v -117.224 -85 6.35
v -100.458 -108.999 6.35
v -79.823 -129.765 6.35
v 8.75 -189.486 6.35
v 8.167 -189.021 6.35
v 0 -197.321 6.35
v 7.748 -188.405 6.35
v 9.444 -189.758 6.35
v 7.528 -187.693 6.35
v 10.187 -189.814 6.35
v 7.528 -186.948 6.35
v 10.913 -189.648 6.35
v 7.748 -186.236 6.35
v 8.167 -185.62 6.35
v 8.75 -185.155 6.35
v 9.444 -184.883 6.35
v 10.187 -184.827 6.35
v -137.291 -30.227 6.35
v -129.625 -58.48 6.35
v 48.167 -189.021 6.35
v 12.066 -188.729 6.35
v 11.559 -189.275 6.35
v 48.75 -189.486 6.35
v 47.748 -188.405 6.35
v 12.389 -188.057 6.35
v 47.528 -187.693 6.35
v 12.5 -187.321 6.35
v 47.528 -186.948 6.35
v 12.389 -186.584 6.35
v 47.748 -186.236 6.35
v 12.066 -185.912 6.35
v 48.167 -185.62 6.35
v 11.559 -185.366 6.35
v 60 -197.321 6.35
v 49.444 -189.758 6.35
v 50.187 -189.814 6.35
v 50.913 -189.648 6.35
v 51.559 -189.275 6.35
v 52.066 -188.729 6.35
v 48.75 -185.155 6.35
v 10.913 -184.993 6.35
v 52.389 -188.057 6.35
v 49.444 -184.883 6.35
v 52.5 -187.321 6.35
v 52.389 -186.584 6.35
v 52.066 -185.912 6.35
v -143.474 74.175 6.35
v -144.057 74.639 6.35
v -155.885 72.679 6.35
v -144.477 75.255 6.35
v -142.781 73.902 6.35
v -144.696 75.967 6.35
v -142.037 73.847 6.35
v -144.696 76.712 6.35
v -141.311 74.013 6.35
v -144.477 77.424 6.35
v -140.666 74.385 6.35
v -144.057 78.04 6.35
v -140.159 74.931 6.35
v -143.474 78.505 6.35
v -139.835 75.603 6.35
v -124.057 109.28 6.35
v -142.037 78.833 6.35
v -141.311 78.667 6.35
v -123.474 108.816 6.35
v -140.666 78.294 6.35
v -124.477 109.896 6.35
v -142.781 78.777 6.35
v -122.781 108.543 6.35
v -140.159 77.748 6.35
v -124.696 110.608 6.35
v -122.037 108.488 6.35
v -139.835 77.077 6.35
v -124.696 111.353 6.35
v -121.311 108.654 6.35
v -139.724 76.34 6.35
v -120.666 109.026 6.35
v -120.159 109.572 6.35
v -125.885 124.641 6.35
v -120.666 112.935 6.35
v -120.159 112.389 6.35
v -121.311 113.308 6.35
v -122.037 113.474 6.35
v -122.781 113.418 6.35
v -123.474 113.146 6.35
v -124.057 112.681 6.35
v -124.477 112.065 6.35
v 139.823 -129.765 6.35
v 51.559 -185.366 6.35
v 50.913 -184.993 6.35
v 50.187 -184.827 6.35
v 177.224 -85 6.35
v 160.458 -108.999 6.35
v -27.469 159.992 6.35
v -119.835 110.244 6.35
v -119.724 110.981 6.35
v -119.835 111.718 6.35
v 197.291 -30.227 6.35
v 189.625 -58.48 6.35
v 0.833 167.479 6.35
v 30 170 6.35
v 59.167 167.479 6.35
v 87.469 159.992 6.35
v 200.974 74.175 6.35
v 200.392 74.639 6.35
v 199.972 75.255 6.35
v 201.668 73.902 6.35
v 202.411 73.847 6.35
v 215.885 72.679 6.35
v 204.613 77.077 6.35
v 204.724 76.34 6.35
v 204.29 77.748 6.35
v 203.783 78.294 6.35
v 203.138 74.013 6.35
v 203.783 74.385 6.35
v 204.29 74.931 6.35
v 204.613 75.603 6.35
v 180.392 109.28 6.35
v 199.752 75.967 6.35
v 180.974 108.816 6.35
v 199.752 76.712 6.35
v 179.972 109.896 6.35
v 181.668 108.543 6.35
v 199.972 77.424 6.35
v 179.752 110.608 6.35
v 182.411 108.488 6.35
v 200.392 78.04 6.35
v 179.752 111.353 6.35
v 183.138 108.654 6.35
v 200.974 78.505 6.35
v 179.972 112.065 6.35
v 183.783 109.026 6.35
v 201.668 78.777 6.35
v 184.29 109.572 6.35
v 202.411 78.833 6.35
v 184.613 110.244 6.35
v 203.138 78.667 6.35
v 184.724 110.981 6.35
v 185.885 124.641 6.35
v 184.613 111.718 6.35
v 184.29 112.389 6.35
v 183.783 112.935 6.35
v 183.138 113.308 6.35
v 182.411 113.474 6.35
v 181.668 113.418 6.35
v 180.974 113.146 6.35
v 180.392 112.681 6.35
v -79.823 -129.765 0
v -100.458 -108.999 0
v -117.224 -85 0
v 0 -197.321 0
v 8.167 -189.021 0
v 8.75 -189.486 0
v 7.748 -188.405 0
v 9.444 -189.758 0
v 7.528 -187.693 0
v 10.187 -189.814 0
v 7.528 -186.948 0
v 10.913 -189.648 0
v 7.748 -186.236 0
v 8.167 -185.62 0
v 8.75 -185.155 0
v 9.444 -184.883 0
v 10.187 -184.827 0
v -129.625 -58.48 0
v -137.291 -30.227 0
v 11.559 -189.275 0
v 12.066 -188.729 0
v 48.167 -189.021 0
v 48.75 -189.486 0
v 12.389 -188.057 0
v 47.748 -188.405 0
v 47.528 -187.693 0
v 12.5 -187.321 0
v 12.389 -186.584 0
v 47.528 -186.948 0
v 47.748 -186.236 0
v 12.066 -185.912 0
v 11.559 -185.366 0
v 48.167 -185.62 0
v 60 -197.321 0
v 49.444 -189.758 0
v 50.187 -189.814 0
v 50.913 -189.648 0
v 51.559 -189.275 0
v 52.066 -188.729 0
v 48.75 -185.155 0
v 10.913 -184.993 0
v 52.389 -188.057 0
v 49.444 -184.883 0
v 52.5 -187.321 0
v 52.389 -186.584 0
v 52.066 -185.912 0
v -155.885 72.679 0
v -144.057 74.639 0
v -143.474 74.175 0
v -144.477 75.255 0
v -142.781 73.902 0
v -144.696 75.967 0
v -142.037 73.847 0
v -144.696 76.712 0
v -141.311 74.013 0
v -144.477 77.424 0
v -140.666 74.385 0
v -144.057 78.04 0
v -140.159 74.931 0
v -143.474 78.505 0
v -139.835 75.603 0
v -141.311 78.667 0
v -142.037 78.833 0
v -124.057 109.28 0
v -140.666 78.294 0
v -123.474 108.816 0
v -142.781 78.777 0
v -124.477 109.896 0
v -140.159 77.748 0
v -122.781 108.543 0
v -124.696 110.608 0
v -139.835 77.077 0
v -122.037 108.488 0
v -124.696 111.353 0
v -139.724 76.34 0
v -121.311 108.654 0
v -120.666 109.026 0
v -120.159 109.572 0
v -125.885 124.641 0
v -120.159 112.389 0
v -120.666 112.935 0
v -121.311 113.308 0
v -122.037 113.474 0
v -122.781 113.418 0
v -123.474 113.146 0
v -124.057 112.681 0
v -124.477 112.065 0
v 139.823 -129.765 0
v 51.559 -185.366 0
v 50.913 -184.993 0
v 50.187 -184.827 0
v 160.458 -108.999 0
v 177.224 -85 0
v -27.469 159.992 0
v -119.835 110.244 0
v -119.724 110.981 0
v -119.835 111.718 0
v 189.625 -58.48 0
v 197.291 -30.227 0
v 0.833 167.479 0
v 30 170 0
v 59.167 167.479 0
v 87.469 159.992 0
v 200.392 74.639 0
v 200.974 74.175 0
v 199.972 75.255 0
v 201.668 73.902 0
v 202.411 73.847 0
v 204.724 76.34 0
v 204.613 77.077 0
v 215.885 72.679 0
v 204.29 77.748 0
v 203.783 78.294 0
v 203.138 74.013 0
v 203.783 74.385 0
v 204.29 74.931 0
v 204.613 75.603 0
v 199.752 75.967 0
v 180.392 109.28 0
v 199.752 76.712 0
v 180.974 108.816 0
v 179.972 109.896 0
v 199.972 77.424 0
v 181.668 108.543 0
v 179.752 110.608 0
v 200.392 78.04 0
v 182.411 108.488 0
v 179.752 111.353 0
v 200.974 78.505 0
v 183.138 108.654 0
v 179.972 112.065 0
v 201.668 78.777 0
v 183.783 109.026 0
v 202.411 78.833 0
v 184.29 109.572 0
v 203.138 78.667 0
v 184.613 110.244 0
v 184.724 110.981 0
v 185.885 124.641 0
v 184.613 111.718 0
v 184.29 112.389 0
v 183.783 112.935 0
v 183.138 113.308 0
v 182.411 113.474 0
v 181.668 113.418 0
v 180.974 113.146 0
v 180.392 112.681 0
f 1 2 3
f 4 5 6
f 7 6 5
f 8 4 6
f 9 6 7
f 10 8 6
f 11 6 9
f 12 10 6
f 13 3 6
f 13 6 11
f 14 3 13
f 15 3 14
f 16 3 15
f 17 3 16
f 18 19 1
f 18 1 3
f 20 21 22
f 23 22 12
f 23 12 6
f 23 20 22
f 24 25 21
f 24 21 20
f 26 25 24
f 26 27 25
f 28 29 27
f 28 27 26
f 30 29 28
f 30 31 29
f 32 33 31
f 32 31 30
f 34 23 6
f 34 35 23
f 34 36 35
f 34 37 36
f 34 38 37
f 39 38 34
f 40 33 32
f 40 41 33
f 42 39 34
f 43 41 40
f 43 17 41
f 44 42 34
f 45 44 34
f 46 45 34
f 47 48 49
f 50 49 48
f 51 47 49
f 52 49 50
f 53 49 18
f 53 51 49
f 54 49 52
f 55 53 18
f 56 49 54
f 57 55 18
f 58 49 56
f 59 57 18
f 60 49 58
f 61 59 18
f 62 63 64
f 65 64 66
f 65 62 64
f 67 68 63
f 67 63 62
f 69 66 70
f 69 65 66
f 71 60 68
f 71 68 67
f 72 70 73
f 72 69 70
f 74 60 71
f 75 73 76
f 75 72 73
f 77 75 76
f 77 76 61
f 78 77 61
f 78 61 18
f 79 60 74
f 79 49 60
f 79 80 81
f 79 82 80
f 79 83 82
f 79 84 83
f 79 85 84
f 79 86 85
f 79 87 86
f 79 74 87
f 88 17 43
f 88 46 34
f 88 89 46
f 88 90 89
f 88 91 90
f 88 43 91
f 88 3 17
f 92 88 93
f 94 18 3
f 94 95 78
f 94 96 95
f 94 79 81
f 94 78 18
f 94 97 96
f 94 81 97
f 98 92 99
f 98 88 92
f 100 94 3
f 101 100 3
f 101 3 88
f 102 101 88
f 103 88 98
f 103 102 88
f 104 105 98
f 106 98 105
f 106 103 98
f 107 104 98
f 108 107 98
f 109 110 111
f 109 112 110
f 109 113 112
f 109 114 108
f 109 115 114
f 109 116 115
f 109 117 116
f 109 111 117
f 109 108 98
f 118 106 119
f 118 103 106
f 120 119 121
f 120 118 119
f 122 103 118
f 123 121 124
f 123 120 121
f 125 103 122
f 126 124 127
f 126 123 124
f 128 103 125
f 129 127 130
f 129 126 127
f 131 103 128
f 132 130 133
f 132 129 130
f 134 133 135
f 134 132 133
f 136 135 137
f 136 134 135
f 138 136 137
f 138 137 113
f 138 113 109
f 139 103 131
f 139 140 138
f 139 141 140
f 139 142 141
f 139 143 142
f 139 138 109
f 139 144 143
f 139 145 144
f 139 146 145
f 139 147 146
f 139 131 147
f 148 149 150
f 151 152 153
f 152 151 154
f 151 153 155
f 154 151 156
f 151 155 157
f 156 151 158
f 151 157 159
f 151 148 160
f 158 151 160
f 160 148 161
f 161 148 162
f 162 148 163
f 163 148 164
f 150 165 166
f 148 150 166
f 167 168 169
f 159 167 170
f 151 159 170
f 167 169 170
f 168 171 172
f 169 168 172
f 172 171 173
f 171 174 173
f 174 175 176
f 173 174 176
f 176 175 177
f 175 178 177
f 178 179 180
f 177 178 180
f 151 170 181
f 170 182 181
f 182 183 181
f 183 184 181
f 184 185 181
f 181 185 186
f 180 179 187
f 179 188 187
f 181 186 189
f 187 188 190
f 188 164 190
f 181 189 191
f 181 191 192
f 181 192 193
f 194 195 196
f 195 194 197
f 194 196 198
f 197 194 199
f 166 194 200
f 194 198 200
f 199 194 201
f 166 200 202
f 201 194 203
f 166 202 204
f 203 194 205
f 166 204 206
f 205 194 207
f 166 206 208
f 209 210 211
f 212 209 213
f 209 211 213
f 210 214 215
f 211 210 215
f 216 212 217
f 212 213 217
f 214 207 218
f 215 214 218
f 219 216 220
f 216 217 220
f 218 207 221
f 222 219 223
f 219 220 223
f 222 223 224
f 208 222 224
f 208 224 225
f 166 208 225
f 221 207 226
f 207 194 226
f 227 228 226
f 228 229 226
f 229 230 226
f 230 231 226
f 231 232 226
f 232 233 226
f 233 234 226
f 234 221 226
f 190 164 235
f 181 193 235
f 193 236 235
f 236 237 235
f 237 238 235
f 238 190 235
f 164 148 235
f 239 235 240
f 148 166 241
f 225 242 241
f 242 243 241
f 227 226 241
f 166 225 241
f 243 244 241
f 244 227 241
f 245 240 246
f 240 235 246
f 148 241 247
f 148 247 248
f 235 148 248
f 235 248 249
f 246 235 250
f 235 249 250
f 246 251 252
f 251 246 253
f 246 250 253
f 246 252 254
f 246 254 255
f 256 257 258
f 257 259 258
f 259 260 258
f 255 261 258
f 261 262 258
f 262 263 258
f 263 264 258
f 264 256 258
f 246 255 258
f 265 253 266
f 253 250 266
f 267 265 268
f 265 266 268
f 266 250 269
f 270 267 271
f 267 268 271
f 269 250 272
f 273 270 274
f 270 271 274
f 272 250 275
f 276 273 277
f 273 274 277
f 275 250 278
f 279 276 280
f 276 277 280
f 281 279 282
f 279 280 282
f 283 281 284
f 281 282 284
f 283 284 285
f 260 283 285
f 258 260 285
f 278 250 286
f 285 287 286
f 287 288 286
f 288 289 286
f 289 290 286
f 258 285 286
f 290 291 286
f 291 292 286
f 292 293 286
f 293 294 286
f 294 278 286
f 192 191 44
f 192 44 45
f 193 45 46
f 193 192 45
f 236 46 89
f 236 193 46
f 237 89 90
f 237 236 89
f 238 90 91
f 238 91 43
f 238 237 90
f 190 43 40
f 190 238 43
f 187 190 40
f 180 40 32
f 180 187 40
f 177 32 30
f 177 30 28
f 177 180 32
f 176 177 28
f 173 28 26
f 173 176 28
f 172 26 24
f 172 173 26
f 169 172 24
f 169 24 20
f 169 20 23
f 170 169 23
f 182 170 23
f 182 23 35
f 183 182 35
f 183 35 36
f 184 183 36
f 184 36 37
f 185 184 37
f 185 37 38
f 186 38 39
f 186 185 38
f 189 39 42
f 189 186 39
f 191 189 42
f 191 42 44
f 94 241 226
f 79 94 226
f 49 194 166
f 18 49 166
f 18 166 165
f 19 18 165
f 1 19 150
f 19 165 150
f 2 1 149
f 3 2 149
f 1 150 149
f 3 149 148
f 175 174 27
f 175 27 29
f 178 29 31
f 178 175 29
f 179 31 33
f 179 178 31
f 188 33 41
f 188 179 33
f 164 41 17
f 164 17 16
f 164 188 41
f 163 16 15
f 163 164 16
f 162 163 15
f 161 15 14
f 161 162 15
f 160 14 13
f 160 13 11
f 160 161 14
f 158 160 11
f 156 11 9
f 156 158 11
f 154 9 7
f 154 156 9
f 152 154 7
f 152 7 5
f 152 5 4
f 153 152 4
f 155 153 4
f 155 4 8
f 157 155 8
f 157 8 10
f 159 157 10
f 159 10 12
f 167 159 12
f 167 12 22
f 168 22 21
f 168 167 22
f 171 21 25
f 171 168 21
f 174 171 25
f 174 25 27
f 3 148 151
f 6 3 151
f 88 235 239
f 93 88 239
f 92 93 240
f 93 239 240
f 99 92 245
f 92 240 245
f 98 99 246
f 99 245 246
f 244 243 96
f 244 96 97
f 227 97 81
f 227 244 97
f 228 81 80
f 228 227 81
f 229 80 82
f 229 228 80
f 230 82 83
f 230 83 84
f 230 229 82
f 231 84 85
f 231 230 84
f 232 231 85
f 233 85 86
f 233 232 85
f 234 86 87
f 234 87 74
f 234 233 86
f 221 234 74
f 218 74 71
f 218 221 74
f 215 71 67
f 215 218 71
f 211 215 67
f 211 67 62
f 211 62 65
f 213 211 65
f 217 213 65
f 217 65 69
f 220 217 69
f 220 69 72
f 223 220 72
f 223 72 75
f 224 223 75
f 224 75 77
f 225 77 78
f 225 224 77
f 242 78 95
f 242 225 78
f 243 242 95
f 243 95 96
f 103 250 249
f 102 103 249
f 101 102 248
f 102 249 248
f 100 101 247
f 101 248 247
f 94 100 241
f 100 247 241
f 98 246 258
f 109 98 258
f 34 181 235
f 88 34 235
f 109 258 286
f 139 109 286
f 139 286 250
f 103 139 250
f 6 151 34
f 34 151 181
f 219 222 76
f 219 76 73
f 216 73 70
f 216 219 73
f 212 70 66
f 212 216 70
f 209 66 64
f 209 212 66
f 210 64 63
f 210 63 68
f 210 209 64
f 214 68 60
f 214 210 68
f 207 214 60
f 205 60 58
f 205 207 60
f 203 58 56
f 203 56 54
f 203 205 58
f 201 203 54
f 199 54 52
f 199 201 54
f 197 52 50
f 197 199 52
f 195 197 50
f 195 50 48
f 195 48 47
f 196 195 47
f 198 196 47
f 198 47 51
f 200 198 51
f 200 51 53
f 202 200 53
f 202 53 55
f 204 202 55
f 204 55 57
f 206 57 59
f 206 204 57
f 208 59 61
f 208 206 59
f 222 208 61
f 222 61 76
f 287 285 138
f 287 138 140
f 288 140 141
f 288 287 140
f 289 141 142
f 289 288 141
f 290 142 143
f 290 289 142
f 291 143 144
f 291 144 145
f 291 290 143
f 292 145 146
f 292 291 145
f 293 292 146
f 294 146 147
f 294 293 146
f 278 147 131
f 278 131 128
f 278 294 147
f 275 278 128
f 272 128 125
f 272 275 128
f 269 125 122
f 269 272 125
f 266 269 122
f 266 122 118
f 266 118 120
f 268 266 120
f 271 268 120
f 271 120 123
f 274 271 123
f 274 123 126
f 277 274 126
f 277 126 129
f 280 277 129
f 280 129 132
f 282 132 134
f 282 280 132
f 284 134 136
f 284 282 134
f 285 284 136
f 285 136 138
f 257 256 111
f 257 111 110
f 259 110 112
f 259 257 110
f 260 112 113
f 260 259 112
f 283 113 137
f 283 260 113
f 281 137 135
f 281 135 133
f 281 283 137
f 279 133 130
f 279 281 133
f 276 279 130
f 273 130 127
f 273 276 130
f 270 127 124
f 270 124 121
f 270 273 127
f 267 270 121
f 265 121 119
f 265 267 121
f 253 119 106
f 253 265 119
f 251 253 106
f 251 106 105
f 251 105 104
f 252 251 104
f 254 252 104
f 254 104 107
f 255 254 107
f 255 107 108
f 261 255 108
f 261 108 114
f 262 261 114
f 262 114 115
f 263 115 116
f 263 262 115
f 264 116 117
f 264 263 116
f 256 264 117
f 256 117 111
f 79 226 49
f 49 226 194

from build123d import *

# Parameters (mm, degrees)
F0_R     = 2.5
F1_DEPTH = 6.35


# Not quite as in the source:
# - a length typed as a fraction of an inch, garbled in the dataset ("3 / 203.2 mm" for 3/8 in), is restored


with BuildPart() as f1:
    # F0 (on Top) → F1 (new body)
    with BuildSketch(Plane.XY):
        with BuildLine():
            Line((-79.8226374756, -129.7651274337), (0, -197.3205080757))
            Line((0, -197.3205080757), (60, -197.3205080757))
            Line((60, -197.3205080757), (139.8226374756, -129.7651274337))
            ThreePointArc((139.8226374756, -129.7651274337), (177.2243186434, -85), (197.2912156208, -30.2266302477))
            Line((197.2912156208, -30.2266302477), (215.8845726812, 72.6794919243))
            Line((215.8845726812, 72.6794919243), (185.8845726812, 124.6410161514))
            Line((185.8845726812, 124.6410161514), (87.4685781451, 159.9917576814))
            ThreePointArc((87.4685781451, 159.9917576814), (30, 170), (-27.4685781451, 159.9917576814))
            Line((-27.4685781451, 159.9917576814), (-125.8845726812, 124.6410161514))
            Line((-125.8845726812, 124.6410161514), (-155.8845726812, 72.6794919243))
            Line((-155.8845726812, 72.6794919243), (-137.2912156208, -30.2266302477))
            ThreePointArc((-137.2912156208, -30.2266302477), (-117.2243186434, -85), (-79.8226374756, -129.7651274337))
        make_face()
        with Locations((10, -187.3205080757)):
            Circle(F0_R, mode=Mode.SUBTRACT)
        with Locations((50, -187.3205080757)):
            Circle(F0_R, mode=Mode.SUBTRACT)
        with Locations((-142.2243186434, 76.3397459622)):
            Circle(F0_R, mode=Mode.SUBTRACT)
        with Locations((-122.2243186434, 110.9807621135)):
            Circle(F0_R, mode=Mode.SUBTRACT)
        with Locations((202.2243186434, 76.3397459622)):
            Circle(F0_R, mode=Mode.SUBTRACT)
        with Locations((182.2243186434, 110.9807621135)):
            Circle(F0_R, mode=Mode.SUBTRACT)
    extrude(amount=F1_DEPTH)


solid = f1.part
